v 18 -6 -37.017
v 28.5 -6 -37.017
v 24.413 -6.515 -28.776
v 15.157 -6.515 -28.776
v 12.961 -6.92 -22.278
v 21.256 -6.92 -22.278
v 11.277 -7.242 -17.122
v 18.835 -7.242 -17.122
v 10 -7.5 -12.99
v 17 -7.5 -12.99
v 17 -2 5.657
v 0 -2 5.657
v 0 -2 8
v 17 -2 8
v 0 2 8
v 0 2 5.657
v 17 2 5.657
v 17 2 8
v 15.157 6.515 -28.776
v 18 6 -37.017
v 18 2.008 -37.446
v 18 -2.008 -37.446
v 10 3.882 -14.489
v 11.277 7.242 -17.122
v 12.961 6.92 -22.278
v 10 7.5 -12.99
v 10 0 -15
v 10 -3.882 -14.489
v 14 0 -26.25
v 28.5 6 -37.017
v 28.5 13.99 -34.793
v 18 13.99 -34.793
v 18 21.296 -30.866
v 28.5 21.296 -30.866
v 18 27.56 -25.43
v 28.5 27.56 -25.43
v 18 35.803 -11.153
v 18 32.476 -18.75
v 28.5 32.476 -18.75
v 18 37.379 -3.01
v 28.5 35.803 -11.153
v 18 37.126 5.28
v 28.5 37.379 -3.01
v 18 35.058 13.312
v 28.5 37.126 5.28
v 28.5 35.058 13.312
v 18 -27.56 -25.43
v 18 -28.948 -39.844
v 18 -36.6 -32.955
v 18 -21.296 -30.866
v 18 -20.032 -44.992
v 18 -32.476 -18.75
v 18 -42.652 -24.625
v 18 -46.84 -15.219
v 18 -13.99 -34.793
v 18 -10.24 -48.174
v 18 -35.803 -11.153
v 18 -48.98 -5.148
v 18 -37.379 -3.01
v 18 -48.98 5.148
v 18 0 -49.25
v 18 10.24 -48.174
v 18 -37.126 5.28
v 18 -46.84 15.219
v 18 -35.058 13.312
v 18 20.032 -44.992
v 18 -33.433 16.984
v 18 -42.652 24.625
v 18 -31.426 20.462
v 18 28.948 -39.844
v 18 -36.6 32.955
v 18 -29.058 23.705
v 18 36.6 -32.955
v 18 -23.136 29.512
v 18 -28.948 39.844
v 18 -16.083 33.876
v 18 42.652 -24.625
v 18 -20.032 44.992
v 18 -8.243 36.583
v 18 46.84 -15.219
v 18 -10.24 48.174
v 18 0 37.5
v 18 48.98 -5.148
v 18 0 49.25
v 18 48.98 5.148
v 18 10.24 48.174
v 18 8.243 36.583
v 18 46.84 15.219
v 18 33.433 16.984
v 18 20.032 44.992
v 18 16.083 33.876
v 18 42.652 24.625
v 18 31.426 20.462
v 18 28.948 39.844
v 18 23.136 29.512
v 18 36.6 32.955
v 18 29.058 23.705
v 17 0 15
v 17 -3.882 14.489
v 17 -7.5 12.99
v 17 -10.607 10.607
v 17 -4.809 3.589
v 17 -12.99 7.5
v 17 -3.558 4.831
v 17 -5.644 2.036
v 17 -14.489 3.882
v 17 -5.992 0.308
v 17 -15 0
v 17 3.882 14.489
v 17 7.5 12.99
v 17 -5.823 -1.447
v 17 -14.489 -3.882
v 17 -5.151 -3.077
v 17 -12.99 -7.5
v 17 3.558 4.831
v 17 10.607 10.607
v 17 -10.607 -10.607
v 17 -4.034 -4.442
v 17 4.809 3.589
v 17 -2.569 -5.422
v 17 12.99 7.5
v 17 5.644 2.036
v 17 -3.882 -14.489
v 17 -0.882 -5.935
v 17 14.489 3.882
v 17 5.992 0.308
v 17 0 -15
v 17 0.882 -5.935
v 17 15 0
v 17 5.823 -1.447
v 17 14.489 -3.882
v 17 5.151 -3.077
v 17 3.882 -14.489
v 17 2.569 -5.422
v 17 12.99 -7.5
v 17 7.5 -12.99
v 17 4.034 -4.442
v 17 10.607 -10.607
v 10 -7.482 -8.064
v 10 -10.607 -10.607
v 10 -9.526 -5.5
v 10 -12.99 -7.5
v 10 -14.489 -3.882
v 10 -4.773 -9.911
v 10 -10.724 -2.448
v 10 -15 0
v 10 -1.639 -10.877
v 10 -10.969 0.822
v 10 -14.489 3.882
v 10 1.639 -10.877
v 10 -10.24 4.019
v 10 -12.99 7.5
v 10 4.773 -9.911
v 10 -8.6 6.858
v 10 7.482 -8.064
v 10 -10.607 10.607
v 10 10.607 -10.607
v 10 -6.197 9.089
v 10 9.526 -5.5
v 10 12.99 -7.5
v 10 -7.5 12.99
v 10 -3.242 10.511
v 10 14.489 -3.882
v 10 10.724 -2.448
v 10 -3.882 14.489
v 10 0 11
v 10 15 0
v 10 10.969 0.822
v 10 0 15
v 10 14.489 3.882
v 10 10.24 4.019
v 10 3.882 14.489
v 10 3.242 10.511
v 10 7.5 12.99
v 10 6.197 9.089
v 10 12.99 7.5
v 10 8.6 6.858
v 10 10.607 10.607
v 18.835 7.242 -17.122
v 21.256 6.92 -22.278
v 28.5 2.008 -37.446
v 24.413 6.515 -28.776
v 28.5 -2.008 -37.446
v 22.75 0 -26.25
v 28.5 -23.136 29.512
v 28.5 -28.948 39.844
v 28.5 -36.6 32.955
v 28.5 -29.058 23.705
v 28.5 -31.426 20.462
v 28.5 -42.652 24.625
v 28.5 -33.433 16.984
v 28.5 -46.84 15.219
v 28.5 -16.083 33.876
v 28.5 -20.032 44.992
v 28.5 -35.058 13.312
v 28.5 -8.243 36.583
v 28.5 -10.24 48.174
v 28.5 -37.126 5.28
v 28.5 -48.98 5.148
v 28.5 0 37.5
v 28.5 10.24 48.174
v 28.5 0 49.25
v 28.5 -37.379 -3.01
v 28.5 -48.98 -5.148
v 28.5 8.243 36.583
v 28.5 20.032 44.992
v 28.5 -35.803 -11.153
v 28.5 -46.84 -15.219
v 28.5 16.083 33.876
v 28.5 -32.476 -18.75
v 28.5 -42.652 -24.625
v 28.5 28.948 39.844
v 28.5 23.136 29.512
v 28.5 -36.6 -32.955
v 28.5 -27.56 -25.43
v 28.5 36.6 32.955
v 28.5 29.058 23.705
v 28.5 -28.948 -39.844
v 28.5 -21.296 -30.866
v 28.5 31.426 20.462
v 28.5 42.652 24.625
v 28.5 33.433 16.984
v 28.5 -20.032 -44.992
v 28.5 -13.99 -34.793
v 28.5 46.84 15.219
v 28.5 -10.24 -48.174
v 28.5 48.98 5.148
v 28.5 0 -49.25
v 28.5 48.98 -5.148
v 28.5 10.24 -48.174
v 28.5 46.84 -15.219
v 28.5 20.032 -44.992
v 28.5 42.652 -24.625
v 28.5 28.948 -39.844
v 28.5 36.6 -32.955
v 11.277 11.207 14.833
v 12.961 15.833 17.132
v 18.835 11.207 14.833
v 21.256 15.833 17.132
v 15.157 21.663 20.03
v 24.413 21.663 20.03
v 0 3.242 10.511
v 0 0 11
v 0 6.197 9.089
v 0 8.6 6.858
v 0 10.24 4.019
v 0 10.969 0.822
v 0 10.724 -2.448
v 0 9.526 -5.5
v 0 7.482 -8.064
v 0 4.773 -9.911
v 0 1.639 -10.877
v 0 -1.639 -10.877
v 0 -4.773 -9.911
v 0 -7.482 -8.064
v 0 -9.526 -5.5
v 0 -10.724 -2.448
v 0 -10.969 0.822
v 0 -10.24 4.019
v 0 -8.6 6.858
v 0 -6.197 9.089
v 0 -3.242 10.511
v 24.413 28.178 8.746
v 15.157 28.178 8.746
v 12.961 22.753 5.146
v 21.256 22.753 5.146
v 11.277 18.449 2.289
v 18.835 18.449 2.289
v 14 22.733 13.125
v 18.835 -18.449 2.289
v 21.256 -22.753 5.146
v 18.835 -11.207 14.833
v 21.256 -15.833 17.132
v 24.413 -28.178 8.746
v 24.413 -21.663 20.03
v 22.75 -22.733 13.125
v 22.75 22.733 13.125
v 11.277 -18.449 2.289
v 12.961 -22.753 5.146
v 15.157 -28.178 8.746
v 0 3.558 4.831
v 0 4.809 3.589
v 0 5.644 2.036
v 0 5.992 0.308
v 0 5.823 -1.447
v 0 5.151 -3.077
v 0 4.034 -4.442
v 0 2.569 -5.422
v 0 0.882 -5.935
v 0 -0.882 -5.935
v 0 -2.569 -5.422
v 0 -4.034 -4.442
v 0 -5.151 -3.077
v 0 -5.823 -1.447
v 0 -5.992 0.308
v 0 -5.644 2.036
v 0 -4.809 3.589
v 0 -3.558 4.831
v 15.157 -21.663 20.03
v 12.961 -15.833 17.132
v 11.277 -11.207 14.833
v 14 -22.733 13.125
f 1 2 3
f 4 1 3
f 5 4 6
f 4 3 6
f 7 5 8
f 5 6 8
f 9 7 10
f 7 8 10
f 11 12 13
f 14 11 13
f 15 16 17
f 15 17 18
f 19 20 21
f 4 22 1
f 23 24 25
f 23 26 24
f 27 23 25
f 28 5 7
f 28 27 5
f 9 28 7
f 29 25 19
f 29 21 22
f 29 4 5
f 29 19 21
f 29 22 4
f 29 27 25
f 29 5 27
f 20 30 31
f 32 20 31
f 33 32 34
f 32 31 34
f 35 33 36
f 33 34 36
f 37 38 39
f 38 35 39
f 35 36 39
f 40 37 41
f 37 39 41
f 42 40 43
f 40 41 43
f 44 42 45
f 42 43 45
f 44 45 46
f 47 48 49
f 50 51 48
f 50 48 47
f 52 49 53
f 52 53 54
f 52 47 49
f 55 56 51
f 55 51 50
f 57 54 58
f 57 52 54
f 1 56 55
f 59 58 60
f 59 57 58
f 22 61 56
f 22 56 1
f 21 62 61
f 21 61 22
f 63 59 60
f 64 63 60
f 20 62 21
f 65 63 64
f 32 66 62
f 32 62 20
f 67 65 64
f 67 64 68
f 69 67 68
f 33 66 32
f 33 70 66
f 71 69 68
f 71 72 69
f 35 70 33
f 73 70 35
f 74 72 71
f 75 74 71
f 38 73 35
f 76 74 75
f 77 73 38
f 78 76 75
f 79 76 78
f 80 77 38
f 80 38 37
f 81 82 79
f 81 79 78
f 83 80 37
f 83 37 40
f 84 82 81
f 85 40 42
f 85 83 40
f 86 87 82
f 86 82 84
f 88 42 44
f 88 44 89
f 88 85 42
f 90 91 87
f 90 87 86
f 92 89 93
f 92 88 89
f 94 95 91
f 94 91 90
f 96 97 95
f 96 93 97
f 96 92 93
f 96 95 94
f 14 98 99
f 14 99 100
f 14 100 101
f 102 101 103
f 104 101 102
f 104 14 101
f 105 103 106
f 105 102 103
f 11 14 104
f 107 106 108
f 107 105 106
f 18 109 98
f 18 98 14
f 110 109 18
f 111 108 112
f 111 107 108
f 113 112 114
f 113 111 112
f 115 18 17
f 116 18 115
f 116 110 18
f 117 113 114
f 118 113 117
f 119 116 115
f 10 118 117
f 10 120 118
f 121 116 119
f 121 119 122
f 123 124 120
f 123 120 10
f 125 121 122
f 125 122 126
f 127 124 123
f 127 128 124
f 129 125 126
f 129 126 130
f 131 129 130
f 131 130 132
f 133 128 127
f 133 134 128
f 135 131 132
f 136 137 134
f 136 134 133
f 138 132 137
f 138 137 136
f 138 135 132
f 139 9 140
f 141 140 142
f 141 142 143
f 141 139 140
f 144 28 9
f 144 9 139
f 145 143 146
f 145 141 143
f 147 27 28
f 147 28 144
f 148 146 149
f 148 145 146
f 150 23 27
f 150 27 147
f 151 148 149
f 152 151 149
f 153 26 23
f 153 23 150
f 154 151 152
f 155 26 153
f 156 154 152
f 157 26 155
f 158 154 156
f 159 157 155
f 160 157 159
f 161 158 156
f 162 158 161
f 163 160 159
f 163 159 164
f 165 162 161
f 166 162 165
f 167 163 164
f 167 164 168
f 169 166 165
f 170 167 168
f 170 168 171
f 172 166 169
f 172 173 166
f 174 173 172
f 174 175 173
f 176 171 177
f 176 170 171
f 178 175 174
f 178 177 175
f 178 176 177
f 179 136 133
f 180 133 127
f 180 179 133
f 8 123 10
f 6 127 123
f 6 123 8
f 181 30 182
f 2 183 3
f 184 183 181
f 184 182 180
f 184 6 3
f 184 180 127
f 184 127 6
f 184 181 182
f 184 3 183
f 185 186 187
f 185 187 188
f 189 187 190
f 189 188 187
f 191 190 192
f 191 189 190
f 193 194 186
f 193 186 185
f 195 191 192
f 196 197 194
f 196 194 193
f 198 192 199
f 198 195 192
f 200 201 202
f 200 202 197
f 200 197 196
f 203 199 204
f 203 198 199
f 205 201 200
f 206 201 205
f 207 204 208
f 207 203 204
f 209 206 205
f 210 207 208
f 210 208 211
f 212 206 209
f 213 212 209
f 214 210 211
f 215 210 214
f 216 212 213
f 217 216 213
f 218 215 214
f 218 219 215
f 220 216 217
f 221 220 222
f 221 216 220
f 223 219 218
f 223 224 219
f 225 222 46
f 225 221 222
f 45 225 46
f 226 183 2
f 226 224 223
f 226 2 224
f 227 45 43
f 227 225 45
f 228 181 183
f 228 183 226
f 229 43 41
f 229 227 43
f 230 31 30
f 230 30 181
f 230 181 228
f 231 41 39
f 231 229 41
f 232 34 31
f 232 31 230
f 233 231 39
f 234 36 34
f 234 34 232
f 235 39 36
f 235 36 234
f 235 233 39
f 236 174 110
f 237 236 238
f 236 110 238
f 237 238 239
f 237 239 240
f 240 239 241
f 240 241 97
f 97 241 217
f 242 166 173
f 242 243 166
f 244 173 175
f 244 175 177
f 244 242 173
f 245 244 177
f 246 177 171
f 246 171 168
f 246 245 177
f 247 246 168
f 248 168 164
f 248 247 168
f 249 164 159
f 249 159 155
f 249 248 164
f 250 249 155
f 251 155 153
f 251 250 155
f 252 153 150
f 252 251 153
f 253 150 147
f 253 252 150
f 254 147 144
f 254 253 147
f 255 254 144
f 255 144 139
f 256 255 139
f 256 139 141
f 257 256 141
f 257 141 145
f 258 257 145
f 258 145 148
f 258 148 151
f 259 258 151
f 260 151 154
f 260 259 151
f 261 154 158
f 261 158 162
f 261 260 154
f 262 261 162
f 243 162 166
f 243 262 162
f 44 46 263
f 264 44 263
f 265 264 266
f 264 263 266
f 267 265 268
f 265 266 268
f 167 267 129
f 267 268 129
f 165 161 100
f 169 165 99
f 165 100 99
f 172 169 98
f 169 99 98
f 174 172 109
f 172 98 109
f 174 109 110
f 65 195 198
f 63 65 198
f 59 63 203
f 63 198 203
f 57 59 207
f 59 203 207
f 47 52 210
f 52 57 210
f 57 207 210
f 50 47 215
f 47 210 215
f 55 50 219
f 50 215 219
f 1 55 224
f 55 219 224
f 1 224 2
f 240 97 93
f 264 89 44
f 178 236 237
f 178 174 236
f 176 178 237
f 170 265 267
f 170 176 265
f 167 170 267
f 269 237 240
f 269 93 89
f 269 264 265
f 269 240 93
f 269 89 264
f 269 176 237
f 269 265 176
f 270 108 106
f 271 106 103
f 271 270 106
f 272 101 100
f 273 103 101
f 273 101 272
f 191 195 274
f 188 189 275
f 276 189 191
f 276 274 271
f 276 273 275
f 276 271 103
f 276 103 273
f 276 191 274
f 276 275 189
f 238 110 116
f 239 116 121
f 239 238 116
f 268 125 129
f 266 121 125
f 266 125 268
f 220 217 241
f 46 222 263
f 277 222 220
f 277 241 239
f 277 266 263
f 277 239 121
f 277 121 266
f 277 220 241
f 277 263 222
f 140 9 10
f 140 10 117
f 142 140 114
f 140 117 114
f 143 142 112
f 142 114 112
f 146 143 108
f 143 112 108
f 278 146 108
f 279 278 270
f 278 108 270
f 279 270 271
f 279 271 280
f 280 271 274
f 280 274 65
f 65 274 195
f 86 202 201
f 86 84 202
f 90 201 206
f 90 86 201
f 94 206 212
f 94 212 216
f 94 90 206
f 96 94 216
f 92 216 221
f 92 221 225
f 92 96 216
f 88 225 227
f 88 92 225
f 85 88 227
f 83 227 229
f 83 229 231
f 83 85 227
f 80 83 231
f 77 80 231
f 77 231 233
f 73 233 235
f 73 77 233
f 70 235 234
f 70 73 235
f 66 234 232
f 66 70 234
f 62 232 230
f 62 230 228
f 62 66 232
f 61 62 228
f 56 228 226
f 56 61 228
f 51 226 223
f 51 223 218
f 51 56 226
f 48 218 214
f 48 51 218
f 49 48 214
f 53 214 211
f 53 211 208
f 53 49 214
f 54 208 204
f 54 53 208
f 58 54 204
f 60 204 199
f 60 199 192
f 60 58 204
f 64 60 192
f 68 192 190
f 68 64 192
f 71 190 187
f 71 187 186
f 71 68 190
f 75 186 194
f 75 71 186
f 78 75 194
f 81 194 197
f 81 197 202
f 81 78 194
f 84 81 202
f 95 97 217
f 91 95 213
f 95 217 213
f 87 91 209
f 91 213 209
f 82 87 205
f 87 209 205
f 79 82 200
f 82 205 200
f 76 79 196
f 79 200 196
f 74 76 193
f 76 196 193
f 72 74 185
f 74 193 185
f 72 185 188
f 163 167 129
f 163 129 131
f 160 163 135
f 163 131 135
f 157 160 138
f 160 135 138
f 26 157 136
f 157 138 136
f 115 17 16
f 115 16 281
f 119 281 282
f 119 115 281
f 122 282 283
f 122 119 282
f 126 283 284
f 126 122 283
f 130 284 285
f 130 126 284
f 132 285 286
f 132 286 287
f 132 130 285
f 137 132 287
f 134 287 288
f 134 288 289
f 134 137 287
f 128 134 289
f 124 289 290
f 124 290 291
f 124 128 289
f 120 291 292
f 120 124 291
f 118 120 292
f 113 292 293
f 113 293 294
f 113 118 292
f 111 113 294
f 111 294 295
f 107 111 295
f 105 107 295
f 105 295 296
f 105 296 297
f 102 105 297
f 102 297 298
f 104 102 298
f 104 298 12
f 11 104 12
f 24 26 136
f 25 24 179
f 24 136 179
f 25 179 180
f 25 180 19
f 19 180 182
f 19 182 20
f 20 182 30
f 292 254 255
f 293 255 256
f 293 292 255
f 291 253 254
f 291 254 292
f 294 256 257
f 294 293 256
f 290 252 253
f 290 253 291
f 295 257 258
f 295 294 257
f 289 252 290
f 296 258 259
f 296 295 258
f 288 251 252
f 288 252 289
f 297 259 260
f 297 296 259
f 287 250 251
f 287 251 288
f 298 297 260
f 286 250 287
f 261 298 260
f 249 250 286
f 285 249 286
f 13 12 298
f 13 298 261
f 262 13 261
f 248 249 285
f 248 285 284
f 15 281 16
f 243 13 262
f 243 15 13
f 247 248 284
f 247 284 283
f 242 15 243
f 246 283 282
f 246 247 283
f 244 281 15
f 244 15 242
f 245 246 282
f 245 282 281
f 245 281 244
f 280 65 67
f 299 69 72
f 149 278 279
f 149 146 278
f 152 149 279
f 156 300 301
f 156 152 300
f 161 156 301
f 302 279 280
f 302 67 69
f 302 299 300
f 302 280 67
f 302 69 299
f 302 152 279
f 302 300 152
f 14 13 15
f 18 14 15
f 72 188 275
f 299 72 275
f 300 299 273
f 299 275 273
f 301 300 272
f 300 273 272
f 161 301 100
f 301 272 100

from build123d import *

# Parameters (mm, degrees)
F2_W            = 4
F2_H            = 8
F3_DEPTH        = 25
F5_DEPTH        = 28.501
F5_COPIES_COUNT = 3


# Not quite as in the source:
# - a pattern or mirror of a feature is missing from the dataset's text; its kind, count and spacing are read off the source's solid


with BuildPart() as f1:
    # F0 (on Front) → F1 (revolve)
    with BuildSketch(Plane.XZ):
        Polygon((0, 11), (0, 6), (17, 6), (17, 15), (28.5, 37.5), (28.5, 49.25), (18, 49.25), (18, 37.5), (10, 15), (10, 11), align=None)
    revolve(axis=Axis((-9.663007474, 0, 0), (-1, 0, 0)))

    # F2 (on Right) → F3 (cut)
    with BuildSketch(Plane.YZ):
        with Locations((0, 4)):
            Rectangle(F2_W, F2_H)
    extrude(amount=F3_DEPTH, mode=Mode.SUBTRACT)

    # F4 (on face) → F5 (cut, through all)
    with BuildSketch(Plane.YZ.offset(28.5)):
        with BuildLine():
            Line((7.5, 12.9903810568), (29.0575654097, 23.7045964416))
            ThreePointArc((29.0575654097, 23.7045964416), (0, 37.5), (-29.0575654097, 23.7045964416))
            Line((-29.0575654097, 23.7045964416), (-7.5, 12.9903810568))
            ThreePointArc((-7.5, 12.9903810568), (0, 15), (7.5, 12.9903810568))
        make_face()
    f5 = extrude(amount=-F5_DEPTH, mode=Mode.SUBTRACT)

    # F5_copies: F5 ×3 about axis
    f5_copies_axis = Axis((0, 0, 0), (1, 0, 0))
    for i in range(1, F5_COPIES_COUNT):
        add(f5.rotate(f5_copies_axis, i * 360 / F5_COPIES_COUNT), mode=Mode.SUBTRACT)


solid = f1.part
